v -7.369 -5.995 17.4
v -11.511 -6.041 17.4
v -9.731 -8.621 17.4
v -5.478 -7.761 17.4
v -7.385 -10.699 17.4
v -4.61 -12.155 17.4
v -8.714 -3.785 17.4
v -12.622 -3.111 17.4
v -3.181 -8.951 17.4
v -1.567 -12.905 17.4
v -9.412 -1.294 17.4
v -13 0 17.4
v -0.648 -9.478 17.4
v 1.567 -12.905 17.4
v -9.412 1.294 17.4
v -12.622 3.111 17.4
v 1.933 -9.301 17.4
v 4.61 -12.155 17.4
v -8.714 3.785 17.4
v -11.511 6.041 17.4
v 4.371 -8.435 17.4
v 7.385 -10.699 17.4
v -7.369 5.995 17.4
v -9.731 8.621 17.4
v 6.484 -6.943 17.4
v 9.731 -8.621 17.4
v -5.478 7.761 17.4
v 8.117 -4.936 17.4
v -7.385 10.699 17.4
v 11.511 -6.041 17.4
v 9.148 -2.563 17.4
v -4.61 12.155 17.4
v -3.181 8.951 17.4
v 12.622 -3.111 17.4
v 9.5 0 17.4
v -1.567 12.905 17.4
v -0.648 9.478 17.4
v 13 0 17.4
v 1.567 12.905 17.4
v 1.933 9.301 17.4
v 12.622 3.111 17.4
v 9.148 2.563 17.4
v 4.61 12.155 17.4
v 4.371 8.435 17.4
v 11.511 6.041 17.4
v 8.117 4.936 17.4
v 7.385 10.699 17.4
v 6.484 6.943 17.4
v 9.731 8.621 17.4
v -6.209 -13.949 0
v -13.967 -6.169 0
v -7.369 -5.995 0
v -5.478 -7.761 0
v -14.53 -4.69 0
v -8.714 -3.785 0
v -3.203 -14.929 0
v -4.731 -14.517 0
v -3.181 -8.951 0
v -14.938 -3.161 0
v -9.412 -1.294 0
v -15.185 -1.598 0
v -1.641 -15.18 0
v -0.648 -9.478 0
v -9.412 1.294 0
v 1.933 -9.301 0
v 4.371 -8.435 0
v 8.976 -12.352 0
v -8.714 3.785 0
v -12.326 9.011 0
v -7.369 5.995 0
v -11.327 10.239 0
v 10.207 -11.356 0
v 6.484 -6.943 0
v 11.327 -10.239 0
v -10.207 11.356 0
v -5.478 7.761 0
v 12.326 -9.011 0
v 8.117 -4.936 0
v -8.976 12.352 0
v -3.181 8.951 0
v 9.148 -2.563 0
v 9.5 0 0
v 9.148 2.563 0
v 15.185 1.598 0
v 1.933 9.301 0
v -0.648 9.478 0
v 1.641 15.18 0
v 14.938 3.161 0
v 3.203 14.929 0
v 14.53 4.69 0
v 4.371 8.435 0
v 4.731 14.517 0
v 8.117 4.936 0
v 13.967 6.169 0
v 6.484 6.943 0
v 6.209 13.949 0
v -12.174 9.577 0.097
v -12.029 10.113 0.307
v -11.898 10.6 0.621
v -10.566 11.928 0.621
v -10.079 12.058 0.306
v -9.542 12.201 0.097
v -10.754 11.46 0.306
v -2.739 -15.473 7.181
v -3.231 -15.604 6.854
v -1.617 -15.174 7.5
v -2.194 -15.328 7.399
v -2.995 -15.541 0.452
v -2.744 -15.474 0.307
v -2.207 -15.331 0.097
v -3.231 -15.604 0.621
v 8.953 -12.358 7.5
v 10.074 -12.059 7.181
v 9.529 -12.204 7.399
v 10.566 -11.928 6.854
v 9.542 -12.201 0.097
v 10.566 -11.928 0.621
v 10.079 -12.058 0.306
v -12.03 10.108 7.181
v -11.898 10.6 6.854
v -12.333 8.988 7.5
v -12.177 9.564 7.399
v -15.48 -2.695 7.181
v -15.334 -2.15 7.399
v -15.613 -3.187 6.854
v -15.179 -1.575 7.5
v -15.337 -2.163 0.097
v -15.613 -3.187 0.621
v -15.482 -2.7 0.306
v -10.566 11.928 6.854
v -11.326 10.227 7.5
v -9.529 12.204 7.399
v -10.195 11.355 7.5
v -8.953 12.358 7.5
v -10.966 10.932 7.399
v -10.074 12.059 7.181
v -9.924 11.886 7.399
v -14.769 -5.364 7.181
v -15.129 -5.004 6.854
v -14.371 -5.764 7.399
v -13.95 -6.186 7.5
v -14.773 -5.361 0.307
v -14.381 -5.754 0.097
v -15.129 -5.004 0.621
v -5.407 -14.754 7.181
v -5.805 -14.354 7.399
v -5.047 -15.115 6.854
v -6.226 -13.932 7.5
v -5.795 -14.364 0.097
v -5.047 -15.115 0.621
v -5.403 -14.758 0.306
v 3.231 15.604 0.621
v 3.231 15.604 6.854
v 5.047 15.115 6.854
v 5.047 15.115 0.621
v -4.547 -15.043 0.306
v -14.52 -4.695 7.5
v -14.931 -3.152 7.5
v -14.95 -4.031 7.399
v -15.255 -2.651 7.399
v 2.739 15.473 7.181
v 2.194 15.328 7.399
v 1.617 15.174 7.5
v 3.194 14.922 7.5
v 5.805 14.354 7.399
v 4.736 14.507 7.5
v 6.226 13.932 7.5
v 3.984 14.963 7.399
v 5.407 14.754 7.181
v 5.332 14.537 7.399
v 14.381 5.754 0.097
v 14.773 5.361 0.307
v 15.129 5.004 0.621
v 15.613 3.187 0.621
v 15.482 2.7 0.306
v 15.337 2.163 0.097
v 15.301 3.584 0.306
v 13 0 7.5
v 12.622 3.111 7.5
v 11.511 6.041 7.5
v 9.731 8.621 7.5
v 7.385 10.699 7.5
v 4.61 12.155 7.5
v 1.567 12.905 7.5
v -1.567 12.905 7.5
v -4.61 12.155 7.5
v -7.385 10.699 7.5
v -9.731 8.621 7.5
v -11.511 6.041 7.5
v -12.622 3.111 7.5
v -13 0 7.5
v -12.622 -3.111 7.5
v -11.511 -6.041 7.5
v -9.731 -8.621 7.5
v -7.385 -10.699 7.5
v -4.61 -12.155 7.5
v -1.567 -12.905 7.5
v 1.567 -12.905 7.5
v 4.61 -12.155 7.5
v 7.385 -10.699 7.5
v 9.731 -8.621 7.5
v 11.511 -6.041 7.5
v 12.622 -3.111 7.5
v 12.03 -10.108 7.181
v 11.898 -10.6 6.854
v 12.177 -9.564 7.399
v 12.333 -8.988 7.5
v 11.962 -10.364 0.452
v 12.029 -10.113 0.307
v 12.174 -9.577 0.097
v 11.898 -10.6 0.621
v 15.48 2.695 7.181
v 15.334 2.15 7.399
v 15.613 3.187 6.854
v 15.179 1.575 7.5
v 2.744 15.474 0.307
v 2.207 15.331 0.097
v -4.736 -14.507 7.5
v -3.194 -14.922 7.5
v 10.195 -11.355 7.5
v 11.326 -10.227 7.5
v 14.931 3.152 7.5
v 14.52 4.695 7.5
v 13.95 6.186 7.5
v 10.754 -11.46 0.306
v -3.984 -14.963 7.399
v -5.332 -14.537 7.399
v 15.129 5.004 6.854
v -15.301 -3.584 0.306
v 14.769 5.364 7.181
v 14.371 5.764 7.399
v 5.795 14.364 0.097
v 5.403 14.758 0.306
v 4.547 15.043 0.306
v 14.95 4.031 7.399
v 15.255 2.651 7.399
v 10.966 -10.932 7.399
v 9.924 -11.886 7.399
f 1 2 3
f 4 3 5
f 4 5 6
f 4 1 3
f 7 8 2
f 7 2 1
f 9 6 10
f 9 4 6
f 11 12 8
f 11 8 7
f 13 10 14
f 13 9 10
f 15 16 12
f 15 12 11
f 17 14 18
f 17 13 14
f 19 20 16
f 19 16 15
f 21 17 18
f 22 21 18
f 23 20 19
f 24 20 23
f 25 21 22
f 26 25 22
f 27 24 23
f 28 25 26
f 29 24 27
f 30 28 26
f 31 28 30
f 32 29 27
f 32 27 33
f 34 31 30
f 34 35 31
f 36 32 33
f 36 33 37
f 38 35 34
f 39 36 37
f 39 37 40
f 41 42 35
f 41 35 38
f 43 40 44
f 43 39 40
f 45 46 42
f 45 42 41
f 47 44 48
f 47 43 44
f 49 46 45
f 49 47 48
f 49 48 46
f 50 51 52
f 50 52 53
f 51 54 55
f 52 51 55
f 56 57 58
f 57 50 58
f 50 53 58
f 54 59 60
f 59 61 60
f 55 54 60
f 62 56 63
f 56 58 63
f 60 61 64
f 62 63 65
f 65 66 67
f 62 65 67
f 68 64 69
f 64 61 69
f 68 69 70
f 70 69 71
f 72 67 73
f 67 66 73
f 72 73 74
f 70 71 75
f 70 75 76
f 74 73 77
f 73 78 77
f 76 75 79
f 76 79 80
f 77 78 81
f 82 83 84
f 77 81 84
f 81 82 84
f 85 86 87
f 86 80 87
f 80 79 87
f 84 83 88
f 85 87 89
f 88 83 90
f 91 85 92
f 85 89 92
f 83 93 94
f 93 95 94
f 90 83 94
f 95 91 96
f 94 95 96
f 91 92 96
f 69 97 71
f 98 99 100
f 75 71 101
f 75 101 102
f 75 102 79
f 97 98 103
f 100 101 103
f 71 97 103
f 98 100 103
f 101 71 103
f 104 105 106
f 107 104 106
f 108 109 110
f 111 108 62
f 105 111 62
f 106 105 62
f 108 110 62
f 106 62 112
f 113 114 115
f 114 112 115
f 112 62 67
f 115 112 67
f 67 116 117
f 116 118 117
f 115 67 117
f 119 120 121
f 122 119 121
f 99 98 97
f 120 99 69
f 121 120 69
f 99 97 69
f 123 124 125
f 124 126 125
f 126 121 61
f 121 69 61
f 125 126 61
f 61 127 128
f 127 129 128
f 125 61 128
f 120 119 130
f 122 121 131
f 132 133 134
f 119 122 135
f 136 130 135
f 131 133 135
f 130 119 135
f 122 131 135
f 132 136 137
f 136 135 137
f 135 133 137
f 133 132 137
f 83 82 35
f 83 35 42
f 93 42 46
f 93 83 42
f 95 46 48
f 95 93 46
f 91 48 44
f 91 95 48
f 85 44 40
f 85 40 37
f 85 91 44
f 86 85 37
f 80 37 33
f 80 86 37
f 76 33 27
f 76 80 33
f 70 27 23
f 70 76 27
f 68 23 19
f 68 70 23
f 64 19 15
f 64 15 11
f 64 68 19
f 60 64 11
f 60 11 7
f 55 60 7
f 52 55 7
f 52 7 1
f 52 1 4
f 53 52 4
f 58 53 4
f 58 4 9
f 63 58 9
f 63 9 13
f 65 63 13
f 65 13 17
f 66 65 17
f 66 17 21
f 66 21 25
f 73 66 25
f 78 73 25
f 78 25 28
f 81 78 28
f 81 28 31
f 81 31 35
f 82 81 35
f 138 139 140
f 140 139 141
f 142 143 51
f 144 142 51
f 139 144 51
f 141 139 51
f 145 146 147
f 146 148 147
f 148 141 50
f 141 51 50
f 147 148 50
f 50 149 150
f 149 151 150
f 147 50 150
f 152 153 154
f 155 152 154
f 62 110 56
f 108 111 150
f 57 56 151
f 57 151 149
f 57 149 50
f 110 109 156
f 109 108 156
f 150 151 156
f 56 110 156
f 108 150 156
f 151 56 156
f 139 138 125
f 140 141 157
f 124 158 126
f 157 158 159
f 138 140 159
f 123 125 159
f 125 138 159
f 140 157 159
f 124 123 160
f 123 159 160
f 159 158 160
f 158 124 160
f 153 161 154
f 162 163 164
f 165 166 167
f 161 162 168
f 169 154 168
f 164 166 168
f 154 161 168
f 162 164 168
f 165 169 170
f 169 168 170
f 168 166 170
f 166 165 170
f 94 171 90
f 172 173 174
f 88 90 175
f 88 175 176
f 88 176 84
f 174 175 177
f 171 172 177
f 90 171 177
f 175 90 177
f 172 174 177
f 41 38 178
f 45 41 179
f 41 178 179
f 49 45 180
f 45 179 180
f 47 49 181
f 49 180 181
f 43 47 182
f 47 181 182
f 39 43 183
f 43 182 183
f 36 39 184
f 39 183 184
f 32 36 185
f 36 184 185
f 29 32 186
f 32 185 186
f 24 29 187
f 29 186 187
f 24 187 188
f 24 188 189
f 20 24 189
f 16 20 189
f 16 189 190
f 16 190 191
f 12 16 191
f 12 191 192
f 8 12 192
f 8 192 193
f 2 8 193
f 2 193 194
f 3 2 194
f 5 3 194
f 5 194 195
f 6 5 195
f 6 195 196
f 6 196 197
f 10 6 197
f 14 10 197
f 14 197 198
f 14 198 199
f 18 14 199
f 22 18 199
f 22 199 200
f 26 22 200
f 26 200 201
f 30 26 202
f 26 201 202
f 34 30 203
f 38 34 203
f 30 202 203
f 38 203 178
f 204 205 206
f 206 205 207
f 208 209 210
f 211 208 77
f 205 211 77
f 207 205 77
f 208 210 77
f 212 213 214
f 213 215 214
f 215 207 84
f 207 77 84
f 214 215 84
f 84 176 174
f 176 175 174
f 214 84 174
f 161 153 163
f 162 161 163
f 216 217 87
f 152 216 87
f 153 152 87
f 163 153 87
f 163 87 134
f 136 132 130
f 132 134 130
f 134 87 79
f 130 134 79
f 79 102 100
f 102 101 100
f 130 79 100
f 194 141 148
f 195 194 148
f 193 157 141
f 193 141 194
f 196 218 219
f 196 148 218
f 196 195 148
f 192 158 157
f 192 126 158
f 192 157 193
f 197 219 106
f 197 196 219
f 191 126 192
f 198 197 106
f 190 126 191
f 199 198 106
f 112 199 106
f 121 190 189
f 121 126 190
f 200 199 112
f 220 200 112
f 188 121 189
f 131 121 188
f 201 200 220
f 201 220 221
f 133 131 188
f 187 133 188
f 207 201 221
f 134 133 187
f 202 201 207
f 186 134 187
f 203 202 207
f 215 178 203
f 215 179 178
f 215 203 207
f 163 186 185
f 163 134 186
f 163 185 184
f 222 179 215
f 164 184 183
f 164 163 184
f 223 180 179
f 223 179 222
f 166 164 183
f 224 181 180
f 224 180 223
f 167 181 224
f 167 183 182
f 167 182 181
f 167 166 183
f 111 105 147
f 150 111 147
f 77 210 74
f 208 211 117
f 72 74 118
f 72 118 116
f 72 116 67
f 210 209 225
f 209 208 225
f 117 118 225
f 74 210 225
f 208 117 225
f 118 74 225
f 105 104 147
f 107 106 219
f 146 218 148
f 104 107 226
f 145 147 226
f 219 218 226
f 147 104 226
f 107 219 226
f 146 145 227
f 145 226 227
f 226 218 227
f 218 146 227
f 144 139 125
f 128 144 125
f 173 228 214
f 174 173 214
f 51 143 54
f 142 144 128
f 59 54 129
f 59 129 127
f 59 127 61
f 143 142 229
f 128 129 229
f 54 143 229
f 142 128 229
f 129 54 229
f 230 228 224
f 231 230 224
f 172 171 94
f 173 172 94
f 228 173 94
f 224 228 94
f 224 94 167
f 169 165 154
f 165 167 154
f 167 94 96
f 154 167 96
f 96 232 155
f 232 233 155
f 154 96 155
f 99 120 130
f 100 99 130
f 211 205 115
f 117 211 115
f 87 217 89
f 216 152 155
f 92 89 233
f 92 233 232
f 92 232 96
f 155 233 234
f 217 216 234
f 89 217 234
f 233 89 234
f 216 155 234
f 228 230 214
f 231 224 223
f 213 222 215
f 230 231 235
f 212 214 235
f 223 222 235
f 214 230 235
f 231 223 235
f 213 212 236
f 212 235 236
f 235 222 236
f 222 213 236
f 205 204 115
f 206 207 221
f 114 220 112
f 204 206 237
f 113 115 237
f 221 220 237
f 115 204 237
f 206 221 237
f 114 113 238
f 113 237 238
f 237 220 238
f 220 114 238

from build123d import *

# Parameters (mm, degrees)
F0_R      = 13
F0_R_2    = 9.5
F1_DEPTH  = 17.4
F2_R      = 14.2
F3_R      = 14.2
F4_DEPTH  = 7.5
F5_R      = 9.5
F6_DEPTH  = 25
F9_R      = 16.7063841851
F9_R_2    = 15.935
F10_DEPTH = 25


with BuildPart() as f1:
    # F0 (on Top) → F1 (new body)
    with BuildSketch(Plane.XY):
        Circle(F0_R)
        Circle(F0_R_2, mode=Mode.SUBTRACT)
    extrude(amount=F1_DEPTH)

    # F2 (on Top) + F3 (on face) → F4 (join)
    with BuildSketch(Plane.XY):
        Circle(F2_R)
    with BuildSketch(Plane.XY):
        Polygon((11.6155659336, -11.648343784), (15.8955445957, 4.2352032858), (4.2799786621, 15.8835470698), (-11.6155659336, 11.648343784), (-15.8955445957, -4.2352032858), (-4.2799786621, -15.8835470698), align=None)
        Circle(F3_R, mode=Mode.SUBTRACT)
    extrude(amount=F4_DEPTH)

    # F5 (on face) → F6 (cut)
    with BuildSketch(Plane.XY):
        Circle(F5_R)
    extrude(amount=F6_DEPTH, mode=Mode.SUBTRACT)

    # F7 (on face) → F8 (revolve, cut)
    with BuildSketch(Plane(origin=(-10.0877616289, -10.0593751778, 0), x_dir=(0.7061097972, -0.7081023614, 0), z_dir=(-0.7081023614, -0.7061097972, 0))):
        with BuildLine():
            ThreePointArc((-5.4935941607, 0), (-7.2307127812, 0.6945951349), (-8.2250423231, 2.2793198004))
            Line((-8.2250423231, 2.2793198004), (-8.2250423231, 0))
            Line((-8.2250423231, 0), (-5.4935941607, 0))
        make_face()
        with BuildLine():
            Line((-8.2250423231, 7.5), (-8.2250423231, 5.0454880111))
            ThreePointArc((-8.2250423231, 5.0454880111), (-7.2682177888, 6.7453516877), (-5.4694527589, 7.5))
            Line((-5.4694527589, 7.5), (-8.2250423231, 7.5))
        make_face()
    revolve(axis=Axis((0, 0, 0), (0, 0, -1)), mode=Mode.SUBTRACT)

    # F9 (on face) → F10 (cut)
    with BuildSketch(Plane(origin=(0, 0, 0), x_dir=(1, 0, 0), z_dir=(0, 0, -1))):
        Circle(F9_R)
        Circle(F9_R_2, mode=Mode.SUBTRACT)
    extrude(amount=-F10_DEPTH, mode=Mode.SUBTRACT)


solid = f1.part
